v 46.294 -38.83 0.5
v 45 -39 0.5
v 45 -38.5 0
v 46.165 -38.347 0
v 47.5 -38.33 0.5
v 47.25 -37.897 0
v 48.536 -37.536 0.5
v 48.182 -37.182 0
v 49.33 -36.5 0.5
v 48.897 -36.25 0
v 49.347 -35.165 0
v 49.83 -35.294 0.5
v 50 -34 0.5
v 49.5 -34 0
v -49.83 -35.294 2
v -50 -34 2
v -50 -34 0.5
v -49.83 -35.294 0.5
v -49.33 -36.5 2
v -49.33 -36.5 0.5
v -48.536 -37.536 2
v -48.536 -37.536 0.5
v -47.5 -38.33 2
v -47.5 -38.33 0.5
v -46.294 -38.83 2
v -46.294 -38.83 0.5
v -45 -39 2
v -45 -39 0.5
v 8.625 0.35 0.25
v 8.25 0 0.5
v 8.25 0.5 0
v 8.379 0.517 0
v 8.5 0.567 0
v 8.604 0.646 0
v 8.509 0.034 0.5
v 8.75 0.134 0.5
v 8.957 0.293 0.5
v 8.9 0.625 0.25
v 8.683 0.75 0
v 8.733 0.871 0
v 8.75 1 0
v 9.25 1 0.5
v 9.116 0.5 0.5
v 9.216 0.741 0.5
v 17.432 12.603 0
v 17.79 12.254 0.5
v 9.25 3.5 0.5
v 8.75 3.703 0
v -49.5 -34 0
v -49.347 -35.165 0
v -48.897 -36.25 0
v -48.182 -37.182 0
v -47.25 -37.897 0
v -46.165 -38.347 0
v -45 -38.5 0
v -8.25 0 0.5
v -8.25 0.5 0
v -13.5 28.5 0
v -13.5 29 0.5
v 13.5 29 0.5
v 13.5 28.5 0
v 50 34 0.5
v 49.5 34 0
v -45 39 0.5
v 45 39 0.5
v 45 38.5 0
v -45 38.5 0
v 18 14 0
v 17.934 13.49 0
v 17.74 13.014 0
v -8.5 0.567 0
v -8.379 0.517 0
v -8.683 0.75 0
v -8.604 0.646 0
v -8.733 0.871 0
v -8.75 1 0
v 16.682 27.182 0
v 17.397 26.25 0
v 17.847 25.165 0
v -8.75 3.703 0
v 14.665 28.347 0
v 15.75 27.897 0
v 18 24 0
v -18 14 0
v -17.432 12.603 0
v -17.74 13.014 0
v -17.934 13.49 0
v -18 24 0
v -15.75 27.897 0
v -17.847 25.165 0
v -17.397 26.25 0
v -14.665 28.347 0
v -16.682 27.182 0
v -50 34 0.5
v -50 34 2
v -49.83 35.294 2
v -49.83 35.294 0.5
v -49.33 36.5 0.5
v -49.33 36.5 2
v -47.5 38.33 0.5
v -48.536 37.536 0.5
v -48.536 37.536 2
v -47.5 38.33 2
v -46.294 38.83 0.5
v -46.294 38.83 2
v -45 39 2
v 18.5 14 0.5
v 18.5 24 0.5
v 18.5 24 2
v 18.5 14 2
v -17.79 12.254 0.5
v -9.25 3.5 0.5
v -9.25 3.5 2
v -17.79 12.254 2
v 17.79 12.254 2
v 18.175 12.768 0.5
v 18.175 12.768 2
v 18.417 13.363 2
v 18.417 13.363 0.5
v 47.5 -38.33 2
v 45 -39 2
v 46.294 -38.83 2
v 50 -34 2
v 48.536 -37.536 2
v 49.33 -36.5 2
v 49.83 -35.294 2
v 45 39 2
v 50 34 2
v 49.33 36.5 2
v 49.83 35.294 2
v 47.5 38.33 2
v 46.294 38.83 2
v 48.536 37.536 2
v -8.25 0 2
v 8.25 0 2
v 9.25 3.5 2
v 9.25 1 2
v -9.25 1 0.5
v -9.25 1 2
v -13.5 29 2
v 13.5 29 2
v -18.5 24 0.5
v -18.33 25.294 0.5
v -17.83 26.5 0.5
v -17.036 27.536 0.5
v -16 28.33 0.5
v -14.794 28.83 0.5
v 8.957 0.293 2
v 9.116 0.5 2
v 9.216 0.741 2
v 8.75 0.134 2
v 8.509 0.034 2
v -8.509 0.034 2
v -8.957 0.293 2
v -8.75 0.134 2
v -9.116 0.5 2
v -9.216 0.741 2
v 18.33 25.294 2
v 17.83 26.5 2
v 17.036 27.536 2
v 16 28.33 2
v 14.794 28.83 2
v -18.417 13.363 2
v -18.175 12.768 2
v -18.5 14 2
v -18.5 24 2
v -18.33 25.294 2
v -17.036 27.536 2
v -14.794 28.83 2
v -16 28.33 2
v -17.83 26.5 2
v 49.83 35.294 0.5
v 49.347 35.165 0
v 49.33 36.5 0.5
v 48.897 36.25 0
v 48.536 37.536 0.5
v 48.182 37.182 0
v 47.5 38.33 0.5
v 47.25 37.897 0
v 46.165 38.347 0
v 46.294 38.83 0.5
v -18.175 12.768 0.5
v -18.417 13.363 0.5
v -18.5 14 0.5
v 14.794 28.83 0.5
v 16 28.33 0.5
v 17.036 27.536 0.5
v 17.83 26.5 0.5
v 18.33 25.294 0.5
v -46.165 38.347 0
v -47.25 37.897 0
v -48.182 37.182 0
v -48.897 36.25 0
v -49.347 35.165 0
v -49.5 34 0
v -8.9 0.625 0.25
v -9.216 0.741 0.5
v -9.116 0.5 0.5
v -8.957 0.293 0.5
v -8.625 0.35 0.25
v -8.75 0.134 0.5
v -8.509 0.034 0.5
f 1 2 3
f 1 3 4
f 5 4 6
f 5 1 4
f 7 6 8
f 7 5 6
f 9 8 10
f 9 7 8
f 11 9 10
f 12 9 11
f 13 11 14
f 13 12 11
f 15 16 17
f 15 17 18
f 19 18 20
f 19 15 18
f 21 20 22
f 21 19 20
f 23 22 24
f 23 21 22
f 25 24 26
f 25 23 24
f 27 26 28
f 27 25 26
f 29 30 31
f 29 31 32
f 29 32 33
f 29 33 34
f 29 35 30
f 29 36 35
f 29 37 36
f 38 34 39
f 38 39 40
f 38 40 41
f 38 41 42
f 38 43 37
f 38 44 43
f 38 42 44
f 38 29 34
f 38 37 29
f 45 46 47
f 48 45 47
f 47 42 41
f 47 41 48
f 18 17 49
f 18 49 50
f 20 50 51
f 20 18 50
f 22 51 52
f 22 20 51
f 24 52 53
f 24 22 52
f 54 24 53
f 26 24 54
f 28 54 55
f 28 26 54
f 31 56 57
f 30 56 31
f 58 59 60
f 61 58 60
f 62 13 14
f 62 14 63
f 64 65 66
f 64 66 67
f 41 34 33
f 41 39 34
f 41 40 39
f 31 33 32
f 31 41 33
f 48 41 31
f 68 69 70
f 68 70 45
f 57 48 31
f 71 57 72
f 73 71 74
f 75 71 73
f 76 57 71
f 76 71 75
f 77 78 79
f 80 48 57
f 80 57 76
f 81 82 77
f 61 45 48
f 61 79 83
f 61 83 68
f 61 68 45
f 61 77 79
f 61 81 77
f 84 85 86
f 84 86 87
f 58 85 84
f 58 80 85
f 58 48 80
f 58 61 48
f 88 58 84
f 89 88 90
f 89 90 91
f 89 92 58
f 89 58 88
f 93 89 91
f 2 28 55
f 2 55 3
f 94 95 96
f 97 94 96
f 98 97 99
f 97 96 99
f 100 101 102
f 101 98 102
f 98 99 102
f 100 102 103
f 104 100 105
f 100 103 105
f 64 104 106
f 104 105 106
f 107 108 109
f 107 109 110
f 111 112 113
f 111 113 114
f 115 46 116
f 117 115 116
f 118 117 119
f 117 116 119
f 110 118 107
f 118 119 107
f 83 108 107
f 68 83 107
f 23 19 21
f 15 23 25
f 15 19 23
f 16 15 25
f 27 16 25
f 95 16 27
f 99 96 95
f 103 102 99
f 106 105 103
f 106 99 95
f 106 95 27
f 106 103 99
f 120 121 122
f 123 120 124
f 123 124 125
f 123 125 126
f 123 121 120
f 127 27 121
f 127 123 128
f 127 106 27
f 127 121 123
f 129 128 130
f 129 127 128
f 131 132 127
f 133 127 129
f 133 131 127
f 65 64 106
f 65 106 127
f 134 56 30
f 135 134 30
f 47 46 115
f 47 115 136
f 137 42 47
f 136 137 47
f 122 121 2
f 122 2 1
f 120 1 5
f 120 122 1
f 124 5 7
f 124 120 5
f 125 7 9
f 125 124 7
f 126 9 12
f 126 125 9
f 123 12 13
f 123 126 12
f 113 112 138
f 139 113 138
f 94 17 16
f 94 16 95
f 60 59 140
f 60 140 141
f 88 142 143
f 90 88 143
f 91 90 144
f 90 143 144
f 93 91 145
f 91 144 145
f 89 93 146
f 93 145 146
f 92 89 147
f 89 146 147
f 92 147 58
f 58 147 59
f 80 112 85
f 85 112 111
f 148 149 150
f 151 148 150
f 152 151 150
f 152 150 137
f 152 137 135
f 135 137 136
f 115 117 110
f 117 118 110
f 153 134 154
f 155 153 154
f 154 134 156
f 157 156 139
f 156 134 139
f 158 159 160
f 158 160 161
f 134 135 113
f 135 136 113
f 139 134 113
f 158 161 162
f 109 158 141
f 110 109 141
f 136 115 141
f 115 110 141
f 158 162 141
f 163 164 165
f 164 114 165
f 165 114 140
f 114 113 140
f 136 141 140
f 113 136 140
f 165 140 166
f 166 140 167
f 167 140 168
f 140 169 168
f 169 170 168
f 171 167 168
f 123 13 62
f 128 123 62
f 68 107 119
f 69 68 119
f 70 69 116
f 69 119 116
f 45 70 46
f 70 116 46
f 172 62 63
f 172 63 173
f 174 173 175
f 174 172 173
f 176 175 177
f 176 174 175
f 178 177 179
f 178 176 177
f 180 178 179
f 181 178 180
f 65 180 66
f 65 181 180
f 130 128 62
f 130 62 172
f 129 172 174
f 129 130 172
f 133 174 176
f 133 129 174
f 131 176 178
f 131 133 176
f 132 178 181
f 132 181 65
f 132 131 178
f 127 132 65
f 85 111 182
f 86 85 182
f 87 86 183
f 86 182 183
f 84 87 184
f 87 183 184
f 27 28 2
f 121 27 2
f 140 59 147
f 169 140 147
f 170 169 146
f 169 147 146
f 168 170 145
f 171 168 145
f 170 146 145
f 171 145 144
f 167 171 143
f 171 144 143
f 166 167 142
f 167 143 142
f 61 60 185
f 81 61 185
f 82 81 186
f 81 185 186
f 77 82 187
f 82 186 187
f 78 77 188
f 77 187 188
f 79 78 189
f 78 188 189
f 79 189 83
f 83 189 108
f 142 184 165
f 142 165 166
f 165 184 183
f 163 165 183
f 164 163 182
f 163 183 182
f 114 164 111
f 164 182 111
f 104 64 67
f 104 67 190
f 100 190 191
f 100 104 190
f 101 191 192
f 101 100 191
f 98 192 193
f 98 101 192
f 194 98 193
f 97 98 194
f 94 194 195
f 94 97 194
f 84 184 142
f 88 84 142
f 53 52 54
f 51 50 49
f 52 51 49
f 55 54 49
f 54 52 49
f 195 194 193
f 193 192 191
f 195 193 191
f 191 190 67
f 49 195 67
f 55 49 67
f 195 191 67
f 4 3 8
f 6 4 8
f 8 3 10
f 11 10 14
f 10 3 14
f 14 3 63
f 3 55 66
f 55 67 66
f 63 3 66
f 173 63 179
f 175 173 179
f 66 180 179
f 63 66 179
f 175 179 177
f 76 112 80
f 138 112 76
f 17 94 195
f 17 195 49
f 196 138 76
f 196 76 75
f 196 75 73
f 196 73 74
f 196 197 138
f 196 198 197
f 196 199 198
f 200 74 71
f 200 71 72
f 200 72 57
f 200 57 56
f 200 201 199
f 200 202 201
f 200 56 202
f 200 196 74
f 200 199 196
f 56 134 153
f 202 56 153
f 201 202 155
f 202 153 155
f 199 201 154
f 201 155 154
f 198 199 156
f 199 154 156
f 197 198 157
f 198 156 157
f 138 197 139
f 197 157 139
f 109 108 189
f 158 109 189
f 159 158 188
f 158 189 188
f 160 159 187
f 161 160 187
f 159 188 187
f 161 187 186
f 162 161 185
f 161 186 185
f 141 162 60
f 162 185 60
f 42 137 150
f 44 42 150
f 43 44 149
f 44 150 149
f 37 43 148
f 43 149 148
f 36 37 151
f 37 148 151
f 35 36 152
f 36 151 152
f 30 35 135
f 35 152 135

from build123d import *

# Parameters (mm, degrees)
SKETCH_W        = 100
SKETCH_H        = 78
PAD_DEPTH       = 2
FILLET_R        = 5
CHAMFER_SIZE    = 0.5
PAD001_DEPTH    = 2
FILLET001_R     = 1
CHAMFER001_SIZE = 0.5


with BuildPart() as base:
    # Sketch → Pad (new body)
    with BuildSketch(Plane.XY):
        Rectangle(SKETCH_W, SKETCH_H)
    extrude(amount=PAD_DEPTH)

    # Fillet
    fillet_edges = [base.edges().sort_by_distance(p)[0] for p in [
        (50, 39, 1),
        (50, -39, 1),
        (-50, -39, 1),
        (-50, 39, 1),
    ]]
    fillet(fillet_edges, radius=FILLET_R)

    # Chamfer
    chamfer_edges = [base.edges().sort_by_distance(p)[0] for p in [
        (0, -39, 0),
        (-50, 0, 0),
        (0, 39, 0),
        (50, 0, 0),
    ]]
    chamfer(chamfer_edges, length=CHAMFER_SIZE)


with BuildPart() as foot:
    # Sketch001 → Pad001 (new body)
    with BuildSketch(Plane.XY):
        with BuildLine():
            Line((-13.5, 29), (13.5, 29))
            ThreePointArc((18.5, 24), (17.035534, 27.535534), (13.5, 29))
            Line((18.5, 24), (18.5, 14))
            ThreePointArc((17.789579, 12.254318), (18.315594, 13.057649), (18.5, 14))
            Line((17.789579, 12.254318), (9.25, 3.5))
            Line((9.25, 0), (9.25, 3.5))
            Line((-9.25, 0), (9.25, 0))
            Line((-9.25, 3.5), (-9.25, 0))
            Line((-9.25, 3.5), (-17.789579, 12.254318))
            ThreePointArc((-18.5, 14), (-18.315594, 13.057649), (-17.789579, 12.254318))
            Line((-18.5, 14), (-18.5, 24))
            ThreePointArc((-13.5, 29), (-17.035534, 27.535534), (-18.5, 24))
        make_face()
    extrude(amount=PAD001_DEPTH)

    # Fillet001
    fillet001_edges = [foot.edges().sort_by_distance(p)[0] for p in [
        (-9.25, 0, 1),
        (9.25, 0, 1),
    ]]
    fillet(fillet001_edges, radius=FILLET001_R)

    # Chamfer001
    chamfer001_edges = [foot.edges().sort_by_distance(p)[0] for p in [
        (-13.51979, 7.877159, 0),
        (0, 0, 0),
        (-8.957107, 0.292893, 0),
        (-9.25, 2.25, 0),
        (-18.5, 19, 0),
        (-18.315594, 13.057649, 0),
        (-17.035534, 27.535534, 0),
        (0, 29, 0),
        (17.035534, 27.535534, 0),
        (18.5, 19, 0),
        (18.315594, 13.057649, 0),
        (13.51979, 7.877159, 0),
        (9.25, 2.25, 0),
        (8.957107, 0.292893, 0),
    ]]
    chamfer(chamfer001_edges, length=CHAMFER001_SIZE)


solid = Compound([base.part, foot.part])
